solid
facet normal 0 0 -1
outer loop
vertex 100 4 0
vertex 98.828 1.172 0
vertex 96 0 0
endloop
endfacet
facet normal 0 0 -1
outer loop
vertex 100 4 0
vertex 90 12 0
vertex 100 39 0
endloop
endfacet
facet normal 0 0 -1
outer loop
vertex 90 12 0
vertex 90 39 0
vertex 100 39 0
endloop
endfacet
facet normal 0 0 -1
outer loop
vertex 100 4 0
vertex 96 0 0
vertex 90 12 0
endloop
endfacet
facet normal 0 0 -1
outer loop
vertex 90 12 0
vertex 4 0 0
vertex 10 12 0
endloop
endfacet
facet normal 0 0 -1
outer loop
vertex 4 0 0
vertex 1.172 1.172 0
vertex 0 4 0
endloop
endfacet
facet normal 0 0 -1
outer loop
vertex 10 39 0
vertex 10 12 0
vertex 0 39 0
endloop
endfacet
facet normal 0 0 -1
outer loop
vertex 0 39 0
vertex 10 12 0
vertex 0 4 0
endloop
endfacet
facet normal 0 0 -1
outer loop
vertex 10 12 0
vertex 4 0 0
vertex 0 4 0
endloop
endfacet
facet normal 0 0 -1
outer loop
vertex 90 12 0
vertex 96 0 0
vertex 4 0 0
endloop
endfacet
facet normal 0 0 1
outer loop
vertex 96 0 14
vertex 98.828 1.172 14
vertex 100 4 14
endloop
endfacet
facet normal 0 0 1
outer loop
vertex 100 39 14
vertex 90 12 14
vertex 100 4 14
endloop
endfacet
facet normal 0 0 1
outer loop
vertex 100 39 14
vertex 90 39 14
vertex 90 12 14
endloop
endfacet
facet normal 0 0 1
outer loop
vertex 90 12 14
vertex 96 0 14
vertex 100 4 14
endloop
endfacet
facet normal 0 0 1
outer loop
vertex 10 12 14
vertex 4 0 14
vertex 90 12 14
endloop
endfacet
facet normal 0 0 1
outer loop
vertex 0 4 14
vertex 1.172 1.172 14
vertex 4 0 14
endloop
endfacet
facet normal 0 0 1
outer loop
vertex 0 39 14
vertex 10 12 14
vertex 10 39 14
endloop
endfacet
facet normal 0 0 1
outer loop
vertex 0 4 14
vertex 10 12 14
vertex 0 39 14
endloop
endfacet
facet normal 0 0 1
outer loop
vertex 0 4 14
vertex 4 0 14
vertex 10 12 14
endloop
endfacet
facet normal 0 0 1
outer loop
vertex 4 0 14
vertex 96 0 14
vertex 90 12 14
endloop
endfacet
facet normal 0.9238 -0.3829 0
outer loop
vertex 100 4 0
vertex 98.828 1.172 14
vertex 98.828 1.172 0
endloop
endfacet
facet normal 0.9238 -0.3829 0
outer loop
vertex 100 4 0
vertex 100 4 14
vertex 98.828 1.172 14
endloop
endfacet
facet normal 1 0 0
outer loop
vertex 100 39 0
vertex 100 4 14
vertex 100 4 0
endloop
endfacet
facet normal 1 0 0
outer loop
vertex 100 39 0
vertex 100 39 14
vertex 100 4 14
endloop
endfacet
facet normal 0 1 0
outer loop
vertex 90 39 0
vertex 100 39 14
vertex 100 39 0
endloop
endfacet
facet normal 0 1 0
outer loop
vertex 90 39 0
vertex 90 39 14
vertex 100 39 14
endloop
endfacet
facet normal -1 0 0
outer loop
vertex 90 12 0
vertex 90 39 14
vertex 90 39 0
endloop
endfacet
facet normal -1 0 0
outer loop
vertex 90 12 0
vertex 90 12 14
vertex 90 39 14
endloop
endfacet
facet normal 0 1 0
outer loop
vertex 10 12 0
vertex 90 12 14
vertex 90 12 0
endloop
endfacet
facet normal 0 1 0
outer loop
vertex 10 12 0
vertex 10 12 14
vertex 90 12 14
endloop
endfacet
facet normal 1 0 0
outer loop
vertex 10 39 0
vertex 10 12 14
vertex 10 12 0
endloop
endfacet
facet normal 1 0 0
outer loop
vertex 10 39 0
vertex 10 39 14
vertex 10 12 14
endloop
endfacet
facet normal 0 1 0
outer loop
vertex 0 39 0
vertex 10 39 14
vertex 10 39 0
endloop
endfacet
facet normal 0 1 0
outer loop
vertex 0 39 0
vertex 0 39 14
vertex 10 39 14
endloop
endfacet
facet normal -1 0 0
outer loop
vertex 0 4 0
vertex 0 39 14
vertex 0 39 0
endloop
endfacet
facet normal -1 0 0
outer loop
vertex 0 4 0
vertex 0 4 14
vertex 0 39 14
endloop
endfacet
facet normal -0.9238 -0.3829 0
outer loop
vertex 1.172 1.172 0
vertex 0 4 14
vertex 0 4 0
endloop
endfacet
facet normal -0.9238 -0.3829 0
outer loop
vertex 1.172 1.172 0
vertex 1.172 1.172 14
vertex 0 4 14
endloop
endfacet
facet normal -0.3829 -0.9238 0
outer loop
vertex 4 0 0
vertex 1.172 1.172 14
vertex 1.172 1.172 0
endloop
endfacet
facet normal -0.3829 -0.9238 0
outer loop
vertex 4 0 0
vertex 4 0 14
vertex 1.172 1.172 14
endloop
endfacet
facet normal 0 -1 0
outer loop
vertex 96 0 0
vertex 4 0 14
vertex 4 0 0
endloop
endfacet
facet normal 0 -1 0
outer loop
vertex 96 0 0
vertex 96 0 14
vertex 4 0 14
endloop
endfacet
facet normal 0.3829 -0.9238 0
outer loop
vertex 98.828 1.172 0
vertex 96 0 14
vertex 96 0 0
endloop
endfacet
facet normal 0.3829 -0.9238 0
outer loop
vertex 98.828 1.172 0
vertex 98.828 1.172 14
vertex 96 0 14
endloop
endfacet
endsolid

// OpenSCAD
$fn = 32;

// ----------------------------------------------------------------------
// Heat sink frame: 100 x 39 mm frame, 10 mm walls
// ----------------------------------------------------------------------

// --- parameters (mm) ---
profile_height = 14;      // extrusion height
profile_points = 12;      // points of the closed outline

profile = [[0, 4], [1.172, 1.172], [4, 0], [96, 0], [98.828, 1.172], [100, 4], [100, 39], [90, 39], [90, 12], [10, 12], [10, 39], [0, 39]];  // single closed polygon, 12 points, counter clockwise

// --- the one profile operation ---
linear_extrude(height = profile_height) polygon(points = profile);
